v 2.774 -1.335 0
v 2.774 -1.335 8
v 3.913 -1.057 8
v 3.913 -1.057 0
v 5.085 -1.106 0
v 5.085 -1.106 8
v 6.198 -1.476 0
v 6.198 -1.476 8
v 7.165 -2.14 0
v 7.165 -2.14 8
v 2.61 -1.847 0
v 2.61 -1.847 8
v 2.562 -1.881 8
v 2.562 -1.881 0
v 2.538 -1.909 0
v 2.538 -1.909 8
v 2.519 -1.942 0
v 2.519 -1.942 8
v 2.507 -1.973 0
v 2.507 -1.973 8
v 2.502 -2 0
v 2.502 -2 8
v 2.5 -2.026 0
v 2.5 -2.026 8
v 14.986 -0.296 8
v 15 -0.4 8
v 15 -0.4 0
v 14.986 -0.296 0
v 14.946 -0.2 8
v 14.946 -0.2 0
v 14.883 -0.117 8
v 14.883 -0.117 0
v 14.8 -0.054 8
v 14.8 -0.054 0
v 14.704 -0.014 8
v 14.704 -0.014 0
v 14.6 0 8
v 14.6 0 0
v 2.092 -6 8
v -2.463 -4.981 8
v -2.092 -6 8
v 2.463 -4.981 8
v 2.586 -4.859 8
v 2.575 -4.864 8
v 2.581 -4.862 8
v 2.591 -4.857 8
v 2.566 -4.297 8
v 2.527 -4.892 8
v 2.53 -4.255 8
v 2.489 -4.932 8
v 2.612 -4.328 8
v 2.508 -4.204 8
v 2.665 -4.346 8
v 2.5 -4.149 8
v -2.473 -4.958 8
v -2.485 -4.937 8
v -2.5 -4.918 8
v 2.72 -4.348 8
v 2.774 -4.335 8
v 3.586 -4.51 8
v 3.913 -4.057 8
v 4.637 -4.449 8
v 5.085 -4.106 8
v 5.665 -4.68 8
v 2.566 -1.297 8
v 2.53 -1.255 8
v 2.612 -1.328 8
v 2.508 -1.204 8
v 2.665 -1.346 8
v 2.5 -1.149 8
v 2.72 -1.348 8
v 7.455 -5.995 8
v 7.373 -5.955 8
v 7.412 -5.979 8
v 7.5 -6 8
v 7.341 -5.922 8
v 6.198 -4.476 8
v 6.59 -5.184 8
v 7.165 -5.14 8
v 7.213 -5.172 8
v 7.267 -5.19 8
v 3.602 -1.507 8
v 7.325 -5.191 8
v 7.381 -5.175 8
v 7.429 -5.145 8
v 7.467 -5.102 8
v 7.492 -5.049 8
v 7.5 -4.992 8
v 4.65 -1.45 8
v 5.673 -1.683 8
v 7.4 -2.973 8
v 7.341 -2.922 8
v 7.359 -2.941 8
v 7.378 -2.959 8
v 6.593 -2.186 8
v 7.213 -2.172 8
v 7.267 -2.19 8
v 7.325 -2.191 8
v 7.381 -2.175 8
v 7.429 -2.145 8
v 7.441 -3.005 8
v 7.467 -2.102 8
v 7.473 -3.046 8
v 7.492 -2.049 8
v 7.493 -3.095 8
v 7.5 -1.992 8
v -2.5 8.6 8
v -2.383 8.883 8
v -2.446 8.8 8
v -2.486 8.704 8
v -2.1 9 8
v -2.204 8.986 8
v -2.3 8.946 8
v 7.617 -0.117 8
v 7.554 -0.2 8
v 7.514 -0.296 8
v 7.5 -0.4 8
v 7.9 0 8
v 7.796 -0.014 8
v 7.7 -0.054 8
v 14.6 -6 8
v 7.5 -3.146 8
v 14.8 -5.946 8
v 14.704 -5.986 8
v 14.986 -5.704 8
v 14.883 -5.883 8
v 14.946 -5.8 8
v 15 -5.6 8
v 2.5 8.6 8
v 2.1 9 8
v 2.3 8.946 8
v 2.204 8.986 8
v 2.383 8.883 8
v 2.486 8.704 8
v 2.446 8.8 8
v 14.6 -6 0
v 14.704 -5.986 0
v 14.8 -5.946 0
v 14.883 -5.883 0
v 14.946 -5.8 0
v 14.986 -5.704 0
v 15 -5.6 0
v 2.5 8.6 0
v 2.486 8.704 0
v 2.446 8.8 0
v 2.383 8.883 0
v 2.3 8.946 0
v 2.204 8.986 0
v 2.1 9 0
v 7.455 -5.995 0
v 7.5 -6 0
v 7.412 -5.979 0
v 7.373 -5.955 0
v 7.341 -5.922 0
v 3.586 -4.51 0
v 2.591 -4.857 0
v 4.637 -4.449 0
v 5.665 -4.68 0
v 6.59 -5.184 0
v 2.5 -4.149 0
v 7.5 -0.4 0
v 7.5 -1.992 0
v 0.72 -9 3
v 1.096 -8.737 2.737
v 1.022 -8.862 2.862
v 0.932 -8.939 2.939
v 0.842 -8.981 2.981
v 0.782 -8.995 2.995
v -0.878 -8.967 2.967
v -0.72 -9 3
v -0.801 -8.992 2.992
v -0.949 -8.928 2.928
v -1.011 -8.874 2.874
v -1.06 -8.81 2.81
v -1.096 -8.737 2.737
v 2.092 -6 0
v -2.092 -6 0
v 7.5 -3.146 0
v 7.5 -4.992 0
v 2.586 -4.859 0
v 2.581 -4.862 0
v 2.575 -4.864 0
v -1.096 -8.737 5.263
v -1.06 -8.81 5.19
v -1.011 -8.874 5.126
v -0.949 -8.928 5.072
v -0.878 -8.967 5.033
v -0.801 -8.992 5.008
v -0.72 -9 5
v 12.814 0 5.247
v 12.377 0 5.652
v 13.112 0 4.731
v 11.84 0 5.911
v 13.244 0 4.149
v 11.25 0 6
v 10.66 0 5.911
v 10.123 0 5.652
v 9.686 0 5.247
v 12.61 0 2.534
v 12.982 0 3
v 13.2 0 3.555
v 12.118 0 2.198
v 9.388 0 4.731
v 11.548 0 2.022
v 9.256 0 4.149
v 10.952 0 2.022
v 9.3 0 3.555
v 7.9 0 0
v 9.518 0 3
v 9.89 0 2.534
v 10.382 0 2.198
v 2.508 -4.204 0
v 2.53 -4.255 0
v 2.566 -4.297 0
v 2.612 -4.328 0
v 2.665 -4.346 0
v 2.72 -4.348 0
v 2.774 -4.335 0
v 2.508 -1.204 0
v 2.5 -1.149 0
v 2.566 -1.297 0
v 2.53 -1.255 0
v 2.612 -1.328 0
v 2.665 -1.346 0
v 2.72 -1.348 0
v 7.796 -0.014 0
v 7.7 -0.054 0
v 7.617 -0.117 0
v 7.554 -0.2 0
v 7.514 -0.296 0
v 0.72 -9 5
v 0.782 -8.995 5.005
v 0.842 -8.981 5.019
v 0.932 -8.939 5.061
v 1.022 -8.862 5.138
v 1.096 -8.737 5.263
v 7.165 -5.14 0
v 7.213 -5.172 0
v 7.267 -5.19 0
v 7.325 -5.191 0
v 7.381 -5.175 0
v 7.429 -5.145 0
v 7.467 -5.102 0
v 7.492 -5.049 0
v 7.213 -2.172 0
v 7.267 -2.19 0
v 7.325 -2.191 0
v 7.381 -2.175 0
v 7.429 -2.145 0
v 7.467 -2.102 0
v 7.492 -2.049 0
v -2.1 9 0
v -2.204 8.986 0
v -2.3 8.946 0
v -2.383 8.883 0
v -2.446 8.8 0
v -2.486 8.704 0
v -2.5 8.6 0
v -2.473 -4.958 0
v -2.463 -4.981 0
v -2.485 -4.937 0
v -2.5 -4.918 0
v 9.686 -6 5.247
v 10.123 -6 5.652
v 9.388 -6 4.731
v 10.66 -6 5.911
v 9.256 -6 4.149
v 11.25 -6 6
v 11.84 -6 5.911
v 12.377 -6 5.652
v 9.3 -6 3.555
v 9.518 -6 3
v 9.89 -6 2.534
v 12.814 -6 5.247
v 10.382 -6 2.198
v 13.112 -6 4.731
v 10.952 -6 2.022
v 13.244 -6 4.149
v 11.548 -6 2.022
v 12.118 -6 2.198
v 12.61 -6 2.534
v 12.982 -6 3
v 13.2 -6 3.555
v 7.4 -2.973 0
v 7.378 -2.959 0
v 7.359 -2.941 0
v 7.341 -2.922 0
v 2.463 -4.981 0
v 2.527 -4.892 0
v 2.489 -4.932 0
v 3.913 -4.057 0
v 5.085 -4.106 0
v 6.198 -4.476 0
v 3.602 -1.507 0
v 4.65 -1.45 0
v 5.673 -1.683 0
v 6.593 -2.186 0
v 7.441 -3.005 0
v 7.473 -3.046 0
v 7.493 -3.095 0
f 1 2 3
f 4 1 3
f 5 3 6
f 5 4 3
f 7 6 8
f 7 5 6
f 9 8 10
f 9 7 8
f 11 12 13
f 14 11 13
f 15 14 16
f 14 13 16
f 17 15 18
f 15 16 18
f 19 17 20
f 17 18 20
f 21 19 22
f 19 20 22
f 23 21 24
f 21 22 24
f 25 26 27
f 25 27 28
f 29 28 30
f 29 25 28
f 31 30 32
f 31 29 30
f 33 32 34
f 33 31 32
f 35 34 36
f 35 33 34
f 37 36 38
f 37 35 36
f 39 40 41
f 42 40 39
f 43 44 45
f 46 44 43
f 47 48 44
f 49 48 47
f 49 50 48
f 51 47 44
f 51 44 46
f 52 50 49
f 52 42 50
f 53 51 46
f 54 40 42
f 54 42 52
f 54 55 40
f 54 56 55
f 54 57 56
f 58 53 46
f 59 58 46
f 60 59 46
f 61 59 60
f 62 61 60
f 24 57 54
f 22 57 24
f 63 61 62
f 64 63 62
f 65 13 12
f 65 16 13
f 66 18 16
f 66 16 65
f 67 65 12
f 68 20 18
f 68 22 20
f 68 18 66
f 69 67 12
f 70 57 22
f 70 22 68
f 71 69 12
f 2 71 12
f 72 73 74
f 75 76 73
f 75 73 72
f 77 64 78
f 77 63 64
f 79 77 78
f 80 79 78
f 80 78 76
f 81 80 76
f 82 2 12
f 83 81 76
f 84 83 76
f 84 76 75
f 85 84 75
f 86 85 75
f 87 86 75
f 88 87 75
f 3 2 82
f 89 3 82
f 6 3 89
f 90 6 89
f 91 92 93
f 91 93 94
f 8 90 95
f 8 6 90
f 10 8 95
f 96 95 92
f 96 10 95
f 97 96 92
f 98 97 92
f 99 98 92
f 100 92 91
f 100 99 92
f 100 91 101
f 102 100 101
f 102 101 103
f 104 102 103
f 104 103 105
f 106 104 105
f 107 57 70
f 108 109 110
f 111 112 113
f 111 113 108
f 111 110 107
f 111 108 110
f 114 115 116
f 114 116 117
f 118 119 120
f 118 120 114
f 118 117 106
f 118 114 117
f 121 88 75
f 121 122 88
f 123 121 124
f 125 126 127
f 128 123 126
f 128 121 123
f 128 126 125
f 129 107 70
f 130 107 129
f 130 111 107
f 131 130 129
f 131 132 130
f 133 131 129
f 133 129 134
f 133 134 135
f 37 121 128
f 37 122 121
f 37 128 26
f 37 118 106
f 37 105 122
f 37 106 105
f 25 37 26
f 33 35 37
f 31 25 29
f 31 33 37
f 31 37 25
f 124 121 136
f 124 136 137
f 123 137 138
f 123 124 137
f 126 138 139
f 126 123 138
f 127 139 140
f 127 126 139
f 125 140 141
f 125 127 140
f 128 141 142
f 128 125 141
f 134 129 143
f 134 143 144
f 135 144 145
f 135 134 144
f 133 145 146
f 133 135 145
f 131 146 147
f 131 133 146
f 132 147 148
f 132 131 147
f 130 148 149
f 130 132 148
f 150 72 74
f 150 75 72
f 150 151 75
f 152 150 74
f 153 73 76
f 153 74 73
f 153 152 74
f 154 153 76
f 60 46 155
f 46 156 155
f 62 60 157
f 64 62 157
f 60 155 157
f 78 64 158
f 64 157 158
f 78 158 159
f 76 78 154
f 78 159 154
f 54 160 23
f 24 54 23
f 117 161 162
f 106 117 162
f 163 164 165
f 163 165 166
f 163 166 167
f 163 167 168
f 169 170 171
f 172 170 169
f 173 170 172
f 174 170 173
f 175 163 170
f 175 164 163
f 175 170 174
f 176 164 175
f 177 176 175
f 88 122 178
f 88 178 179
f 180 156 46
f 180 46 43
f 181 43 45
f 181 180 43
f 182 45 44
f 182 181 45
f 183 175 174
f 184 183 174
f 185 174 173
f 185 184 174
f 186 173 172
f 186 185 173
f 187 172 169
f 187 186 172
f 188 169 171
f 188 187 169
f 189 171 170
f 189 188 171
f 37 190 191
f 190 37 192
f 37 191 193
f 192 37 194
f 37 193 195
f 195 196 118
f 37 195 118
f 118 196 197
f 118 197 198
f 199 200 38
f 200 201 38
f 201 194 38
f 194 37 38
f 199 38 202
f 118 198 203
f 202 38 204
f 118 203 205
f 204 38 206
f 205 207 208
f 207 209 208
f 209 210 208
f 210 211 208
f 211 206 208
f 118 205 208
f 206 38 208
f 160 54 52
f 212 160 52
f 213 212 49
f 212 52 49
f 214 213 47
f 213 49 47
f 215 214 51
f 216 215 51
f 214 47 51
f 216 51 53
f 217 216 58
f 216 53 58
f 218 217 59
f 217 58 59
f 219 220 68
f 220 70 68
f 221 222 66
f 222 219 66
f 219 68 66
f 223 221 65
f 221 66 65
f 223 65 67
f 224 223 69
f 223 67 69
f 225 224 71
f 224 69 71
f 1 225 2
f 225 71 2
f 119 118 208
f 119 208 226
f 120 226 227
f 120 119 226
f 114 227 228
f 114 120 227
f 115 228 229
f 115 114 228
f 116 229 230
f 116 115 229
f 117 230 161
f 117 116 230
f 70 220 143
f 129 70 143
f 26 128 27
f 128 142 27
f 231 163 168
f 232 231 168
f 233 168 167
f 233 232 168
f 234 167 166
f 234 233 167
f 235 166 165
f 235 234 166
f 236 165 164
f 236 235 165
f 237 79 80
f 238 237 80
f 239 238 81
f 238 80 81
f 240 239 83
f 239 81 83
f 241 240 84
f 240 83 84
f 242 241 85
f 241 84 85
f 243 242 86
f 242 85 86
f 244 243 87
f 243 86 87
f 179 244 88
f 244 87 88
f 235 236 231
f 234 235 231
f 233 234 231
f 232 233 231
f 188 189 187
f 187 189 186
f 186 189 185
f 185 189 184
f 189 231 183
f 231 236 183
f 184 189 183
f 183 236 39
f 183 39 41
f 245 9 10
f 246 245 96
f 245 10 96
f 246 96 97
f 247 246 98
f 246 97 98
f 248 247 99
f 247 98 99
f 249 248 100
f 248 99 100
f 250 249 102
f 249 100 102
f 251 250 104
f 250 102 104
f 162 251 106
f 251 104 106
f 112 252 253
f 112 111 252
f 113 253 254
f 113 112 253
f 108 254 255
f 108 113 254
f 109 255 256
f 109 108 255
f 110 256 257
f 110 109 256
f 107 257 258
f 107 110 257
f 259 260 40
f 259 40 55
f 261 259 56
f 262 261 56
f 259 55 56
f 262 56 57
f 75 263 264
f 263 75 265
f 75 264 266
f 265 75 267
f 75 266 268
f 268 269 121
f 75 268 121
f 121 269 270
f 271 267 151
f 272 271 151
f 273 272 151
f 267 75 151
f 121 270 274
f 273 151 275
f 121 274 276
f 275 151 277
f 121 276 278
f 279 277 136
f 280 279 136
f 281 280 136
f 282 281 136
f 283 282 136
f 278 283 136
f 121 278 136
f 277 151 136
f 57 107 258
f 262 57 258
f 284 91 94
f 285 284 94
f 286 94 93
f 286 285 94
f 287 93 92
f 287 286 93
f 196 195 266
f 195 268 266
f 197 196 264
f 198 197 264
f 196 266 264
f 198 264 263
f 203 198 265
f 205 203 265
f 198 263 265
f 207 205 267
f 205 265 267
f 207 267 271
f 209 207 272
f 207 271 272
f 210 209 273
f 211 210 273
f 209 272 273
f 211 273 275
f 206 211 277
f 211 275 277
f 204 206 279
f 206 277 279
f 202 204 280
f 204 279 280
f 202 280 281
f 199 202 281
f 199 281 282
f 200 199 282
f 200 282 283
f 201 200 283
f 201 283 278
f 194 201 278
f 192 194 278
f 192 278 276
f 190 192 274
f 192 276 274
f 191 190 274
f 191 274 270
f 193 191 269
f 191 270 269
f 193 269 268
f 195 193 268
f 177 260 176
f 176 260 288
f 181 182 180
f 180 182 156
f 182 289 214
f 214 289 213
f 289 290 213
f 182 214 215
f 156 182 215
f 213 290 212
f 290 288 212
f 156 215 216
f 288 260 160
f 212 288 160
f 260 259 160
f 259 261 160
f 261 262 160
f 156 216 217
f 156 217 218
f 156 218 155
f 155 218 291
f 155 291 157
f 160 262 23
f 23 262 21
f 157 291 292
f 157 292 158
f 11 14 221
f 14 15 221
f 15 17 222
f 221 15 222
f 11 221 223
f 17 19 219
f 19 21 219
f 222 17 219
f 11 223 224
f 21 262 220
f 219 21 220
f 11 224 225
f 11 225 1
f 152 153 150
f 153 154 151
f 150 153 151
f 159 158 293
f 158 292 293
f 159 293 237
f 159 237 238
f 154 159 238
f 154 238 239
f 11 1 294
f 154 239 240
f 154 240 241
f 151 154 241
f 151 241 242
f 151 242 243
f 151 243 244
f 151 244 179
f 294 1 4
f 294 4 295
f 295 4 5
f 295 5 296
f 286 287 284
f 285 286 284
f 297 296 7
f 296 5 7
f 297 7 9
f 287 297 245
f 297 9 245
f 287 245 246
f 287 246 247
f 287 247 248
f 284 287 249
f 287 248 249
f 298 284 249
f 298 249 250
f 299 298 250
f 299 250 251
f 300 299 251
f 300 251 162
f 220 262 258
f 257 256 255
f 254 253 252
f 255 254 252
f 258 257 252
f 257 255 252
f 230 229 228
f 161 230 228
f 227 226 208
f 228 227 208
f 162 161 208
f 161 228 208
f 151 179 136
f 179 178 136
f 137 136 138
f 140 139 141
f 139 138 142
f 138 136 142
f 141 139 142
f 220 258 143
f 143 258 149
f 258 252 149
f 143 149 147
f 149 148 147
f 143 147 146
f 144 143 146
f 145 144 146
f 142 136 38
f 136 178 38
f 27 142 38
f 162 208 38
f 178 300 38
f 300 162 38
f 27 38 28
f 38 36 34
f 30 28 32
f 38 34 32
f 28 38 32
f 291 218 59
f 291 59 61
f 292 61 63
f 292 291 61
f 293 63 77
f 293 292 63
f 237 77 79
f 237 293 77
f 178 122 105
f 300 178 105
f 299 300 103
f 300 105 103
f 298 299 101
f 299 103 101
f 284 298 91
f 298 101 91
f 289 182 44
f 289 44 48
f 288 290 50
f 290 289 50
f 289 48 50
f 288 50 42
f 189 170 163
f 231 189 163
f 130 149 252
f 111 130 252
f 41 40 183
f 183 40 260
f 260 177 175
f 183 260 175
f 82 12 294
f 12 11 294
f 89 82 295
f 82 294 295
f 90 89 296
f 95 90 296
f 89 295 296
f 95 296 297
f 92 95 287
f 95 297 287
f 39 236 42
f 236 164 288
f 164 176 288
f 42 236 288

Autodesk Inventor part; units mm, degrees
ref_plane "YZ Plane" through (0, 0, 0) normal (1, 0, 0) x (0, 1, 0)
ref_plane "XZ Plane" through (0, 0, 0) normal (0, 1, 0) x (-1, 0, 0)
ref_plane "XY Plane" through (0, 0, 0) normal (0, 0, 1) x (1, 0, 0)
sketch "Sketch1" plane through (0, 0, 0) normal (0, 0, 1) x (1, 0, 0)
  line L0 (-2.5, 9) -> (2.5, 9)
  line L1 (2.5, 9) -> (2.5, -9)
  line L2 (2.5, -9) -> (-2.5, -9)
  line L3 (-2.5, -9) -> (-2.5, 9)
  line L4 (-2.5, 9) -> (2.5, -9) construction
  line L5 (2.5, 9) -> (-2.5, -9) construction
  line L6 (-15, 0) -> (-7.5, 0)
  line L7 (-7.5, 0) -> (-7.5, -3)
  line L8 (-7.5, -3) -> (-15, -3)
  line L9 (-15, -3) -> (-15, 0)
  line L10 (7.5, 0) -> (15, 0)
  line L11 (15, 0) -> (15, -3)
  line L12 (15, -3) -> (7.5, -3)
  line L13 (7.5, -3) -> (7.5, 0)
  line L14 (7.5, -3) -> (7.5, -6)
  line L15 (7.5, -6) -> (15, -6)
  line L16 (15, -6) -> (15, -3)
  line L17 (-7.5, -3) -> (-7.5, -6)
  line L18 (-7.5, -6) -> (-15, -6)
  line L19 (-15, -6) -> (-15, -3)
  line L20 (-7.5, -1.5) -> (7.5, -1.5) construction
  line L21 (-1, -9) -> (-2.5, -4.878784)
  line L22 (1, -9) -> (2.5, -4.878784)
  arc A0 (-2.5, -4.678784) -> (-7.5, -5.8) centre (-4.32787, -8.236717) ccw construction
  arc A1 (-2.408606, -4.500887) -> (-7.658606, -5.678164) centre (-4.32787, -8.236717) ccw
  arc A2 (-2.591394, -4.856681) -> (-7.341394, -5.921836) centre (-4.32787, -8.236717) ccw
  arc A3 (-2.591394, -4.856681) -> (-2.408606, -4.500887) centre (-2.5, -4.678784) ccw
  arc A4 (-7.658606, -5.678164) -> (-7.341394, -5.921836) centre (-7.5, -5.8) ccw
  arc A5 (7.5, -5.8) -> (2.5, -4.678784) centre (4.32787, -8.236717) ccw construction
  arc A6 (7.658606, -5.678164) -> (2.408606, -4.500887) centre (4.32787, -8.236717) ccw
  arc A7 (7.341394, -5.921836) -> (2.591394, -4.856681) centre (4.32787, -8.236717) ccw
  arc A8 (7.341394, -5.921836) -> (7.658606, -5.678164) centre (7.5, -5.8) ccw
  arc A9 (2.408606, -4.500887) -> (2.591394, -4.856681) centre (2.5, -4.678784) ccw
  arc A10 (-2.5, -1.678784) -> (-7.5, -2.8) centre (-4.32787, -5.236717) ccw construction
  arc A11 (-2.408606, -1.500887) -> (-7.658606, -2.678164) centre (-4.32787, -5.236717) ccw
  arc A12 (-2.591394, -1.856681) -> (-7.341394, -2.921836) centre (-4.32787, -5.236717) ccw
  arc A13 (-2.591394, -1.856681) -> (-2.408606, -1.500887) centre (-2.5, -1.678784) ccw
  arc A14 (-7.658606, -2.678164) -> (-7.341394, -2.921836) centre (-7.5, -2.8) ccw
  arc A15 (7.5, -2.8) -> (2.5, -1.678784) centre (4.32787, -5.236717) ccw construction
  arc A16 (7.658606, -2.678164) -> (2.408606, -1.500887) centre (4.32787, -5.236717) ccw
  arc A17 (7.341394, -2.921836) -> (2.591394, -1.856681) centre (4.32787, -5.236717) ccw
  arc A18 (7.341394, -2.921836) -> (7.658606, -2.678164) centre (7.5, -2.8) ccw
  arc A19 (2.408606, -1.500887) -> (2.591394, -1.856681) centre (2.5, -1.678784) ccw
  point P0 (0, 0)
  point P1 (0, -1.5)
  point P2 (-7.5, -5.483975)
  point P3 (-2.5, -1.878784)
  point P4 (-2.5, -4.45533)
  point P5 (7.5, -5.483975)
  point P6 (2.5, -4.45533)
  point P7 (2.5, -1.878784)
  point P8 (7.5, -2.483975)
  point P9 (2.5, -1.45533)
  point P10 (-2.5, -1.45533)
  point P11 (-7.5, -2.483975)
  dimension "d0" = 5
  dimension "d1" = 18
  dimension "d2" = 30
  dimension "d3" = 3
  dimension "d4" = 3
  dimension "d5" = 5
  dimension "d8" = 9
  dimension "d9" = 3
  dimension "d10" = 2
  dimension "d11" = 20
  dimension "d12" = 0.4
  dimension "d13" = 4
  dimension "d14" = 3
sketch "Sketch1 outline for Extrusion1" plane through (0, 0, 0) normal (0, 0, 1) x (1, 0, 0)
  arc A0 (-7.5, -6) -> (-7.341394, -5.921836) centre (-7.5, -5.8) ccw
  line L0 (-15, -6) -> (-7.5, -6)
  arc A1 (-7.341394, -5.921836) -> (-2.591394, -4.856681) centre (-4.32787, -8.236717) cw
  line L1 (-15, -3) -> (-15, -6)
  arc A2 (-2.591394, -4.856681) -> (-2.5, -4.878784) centre (-2.5, -4.678784) ccw
  line L2 (-15, 0) -> (-15, -3)
  line L3 (-2.5, -4.878784) -> (-1, -9)
  line L4 (-7.5, 0) -> (-15, 0)
  line L5 (-1, -9) -> (1, -9)
  line L6 (-7.5, -2.483975) -> (-7.5, 0)
  line L7 (1, -9) -> (2.5, -4.878784)
  arc A3 (-2.5, -1.45533) -> (-7.5, -2.483975) centre (-4.32787, -5.236717) ccw
  arc A4 (2.5, -4.878784) -> (2.591394, -4.856681) centre (2.5, -4.678784) ccw
  line L8 (-2.5, 9) -> (-2.5, -1.45533)
  arc A5 (2.591394, -4.856681) -> (7.341394, -5.921836) centre (4.32787, -8.236717) cw
  line L9 (2.5, 9) -> (-2.5, 9)
  arc A6 (7.341394, -5.921836) -> (7.5, -6) centre (7.5, -5.8) ccw
  line L10 (2.5, -1.45533) -> (2.5, 9)
  line L11 (7.5, -6) -> (15, -6)
  arc A7 (7.5, -2.483975) -> (2.5, -1.45533) centre (4.32787, -5.236717) ccw
  line L12 (15, -6) -> (15, -3)
  line L13 (7.5, 0) -> (7.5, -2.483975)
  line L14 (15, -3) -> (15, 0)
  line L15 (15, 0) -> (7.5, 0)
  line L16 (-7.5, -5.483975) -> (-7.5, -3)
  arc A8 (-2.5, -4.45533) -> (-7.5, -5.483975) centre (-4.32787, -8.236717) ccw
  line L17 (-2.5, -1.878784) -> (-2.5, -4.45533)
  arc A9 (-2.591394, -1.856681) -> (-2.5, -1.878784) centre (-2.5, -1.678784) ccw
  arc A10 (-7.341394, -2.921836) -> (-2.591394, -1.856681) centre (-4.32787, -5.236717) cw
  arc A11 (-7.5, -3) -> (-7.341394, -2.921836) centre (-7.5, -2.8) ccw
  arc A12 (7.5, -5.483975) -> (2.5, -4.45533) centre (4.32787, -8.236717) ccw
  line L18 (7.5, -3) -> (7.5, -5.483975)
  arc A13 (7.341394, -2.921836) -> (7.5, -3) centre (7.5, -2.8) ccw
  arc A14 (2.591394, -1.856681) -> (7.341394, -2.921836) centre (4.32787, -5.236717) cw
  arc A15 (2.5, -1.878784) -> (2.591394, -1.856681) centre (2.5, -1.678784) ccw
  line L19 (2.5, -4.45533) -> (2.5, -1.878784)
extrude "Extrusion1" add sketch "Sketch1 outline for Extrusion1" along normal blind 8
chamfer "Chamfer1" distance 3 angle 45 1 edges at (0, -9, 0) measured on face at (-0.3333, -9, 2.6667)
chamfer "Chamfer2" distance 3 angle 45 1 edges at (0, -9, 8) measured on face at (-0.3333, -9, 4.6667)
fillet "Fillet1" radius 0.2 14 edges at (-7.5, -2.484, 4) (-7.5, -3, 4) (-7.5, -5.484, 4) (-2.5, -4.8788, 4) (-2.5, -4.4553, 4) (-2.5, -1.8788, 4) (-2.5, -1.4553, 4) (2.5, -1.4553, 4) (2.5, -1.8788, 4) (2.5, -4.4553, 4) (2.5, -4.8788, 4) (7.5, -5.484, 4) (7.5, -3, 4) (7.5, -2.484, 4)
fillet "Fillet2" radius 0.4 12 edges at (-15, 0, 4) (-15, -3, 4) (15, -3, 4) (15, 0, 4) (7.5, 0, 4) (15, -6, 4) (-15, -6, 4) (-7.5, 0, 4) (-2.5, 9, 4) (2.5, 9, 4) (-1, -9, 4) (1, -9, 4)
sketch "Sketch3" plane through (-14.6, 0, 0) normal (0, 1, 0) x (1, 0, 0)
  line L0 (3.35, -4) -> (25.85, -4) construction
  line L1 (16.7, 0) -> (12.5, 0) projected
  line L2 (29.2, 0) -> (29.2, -8) projected
  line L3 (6.7, -8) -> (0, -8) projected
  point P0 (14.6, 0)
  point P1 (14.6, -4)
  point P2 (14.6, 0)
  point P3 (29.2, -4)
  point P4 (3.35, -8)
hole "Hole2" at (-11.25, 0, 4) at (11.25, 0, 4) direction (0, -1, 0) diameter 4 end through all
sketch "Sketch4" plane through (-2.1, 9, 0) normal (0, 1, 0) x (1, 0, 0)
  line L0 (-12.9, 0) -> (-0.4, 0)
  line L1 (-0.4, 0) -> (-0.4, -8)
  line L2 (-0.4, -8) -> (-12.9, -8)
  line L3 (-12.9, -8) -> (-12.9, 0)
  line L4 (-5.8, -8) -> (-12.5, -8) projected
  line L5 (-5.8, 0) -> (-12.5, 0) projected
  line L6 (-12.9, 0) -> (-12.9, -8) projected
  line L7 (-0.4, 0) -> (-0.4, -8) projected
  point P0 (2.1, 0)
sketch "Sketch4 outline for Extrusion2" plane through (-2.1, 9, 0) normal (0, 1, 0) x (1, 0, 0)
  line L0 (-12.9, 0) -> (-12.9, -8)
  line L1 (-0.4, 0) -> (-12.9, 0)
  line L2 (-0.4, -8) -> (-0.4, 0)
  line L3 (-12.9, -8) -> (-0.4, -8)
extrude "Extrusion2" cut sketch "Sketch4 outline for Extrusion2" against normal through all
equation "\"d4\" = d3"
properties part number "Actuator 2"
